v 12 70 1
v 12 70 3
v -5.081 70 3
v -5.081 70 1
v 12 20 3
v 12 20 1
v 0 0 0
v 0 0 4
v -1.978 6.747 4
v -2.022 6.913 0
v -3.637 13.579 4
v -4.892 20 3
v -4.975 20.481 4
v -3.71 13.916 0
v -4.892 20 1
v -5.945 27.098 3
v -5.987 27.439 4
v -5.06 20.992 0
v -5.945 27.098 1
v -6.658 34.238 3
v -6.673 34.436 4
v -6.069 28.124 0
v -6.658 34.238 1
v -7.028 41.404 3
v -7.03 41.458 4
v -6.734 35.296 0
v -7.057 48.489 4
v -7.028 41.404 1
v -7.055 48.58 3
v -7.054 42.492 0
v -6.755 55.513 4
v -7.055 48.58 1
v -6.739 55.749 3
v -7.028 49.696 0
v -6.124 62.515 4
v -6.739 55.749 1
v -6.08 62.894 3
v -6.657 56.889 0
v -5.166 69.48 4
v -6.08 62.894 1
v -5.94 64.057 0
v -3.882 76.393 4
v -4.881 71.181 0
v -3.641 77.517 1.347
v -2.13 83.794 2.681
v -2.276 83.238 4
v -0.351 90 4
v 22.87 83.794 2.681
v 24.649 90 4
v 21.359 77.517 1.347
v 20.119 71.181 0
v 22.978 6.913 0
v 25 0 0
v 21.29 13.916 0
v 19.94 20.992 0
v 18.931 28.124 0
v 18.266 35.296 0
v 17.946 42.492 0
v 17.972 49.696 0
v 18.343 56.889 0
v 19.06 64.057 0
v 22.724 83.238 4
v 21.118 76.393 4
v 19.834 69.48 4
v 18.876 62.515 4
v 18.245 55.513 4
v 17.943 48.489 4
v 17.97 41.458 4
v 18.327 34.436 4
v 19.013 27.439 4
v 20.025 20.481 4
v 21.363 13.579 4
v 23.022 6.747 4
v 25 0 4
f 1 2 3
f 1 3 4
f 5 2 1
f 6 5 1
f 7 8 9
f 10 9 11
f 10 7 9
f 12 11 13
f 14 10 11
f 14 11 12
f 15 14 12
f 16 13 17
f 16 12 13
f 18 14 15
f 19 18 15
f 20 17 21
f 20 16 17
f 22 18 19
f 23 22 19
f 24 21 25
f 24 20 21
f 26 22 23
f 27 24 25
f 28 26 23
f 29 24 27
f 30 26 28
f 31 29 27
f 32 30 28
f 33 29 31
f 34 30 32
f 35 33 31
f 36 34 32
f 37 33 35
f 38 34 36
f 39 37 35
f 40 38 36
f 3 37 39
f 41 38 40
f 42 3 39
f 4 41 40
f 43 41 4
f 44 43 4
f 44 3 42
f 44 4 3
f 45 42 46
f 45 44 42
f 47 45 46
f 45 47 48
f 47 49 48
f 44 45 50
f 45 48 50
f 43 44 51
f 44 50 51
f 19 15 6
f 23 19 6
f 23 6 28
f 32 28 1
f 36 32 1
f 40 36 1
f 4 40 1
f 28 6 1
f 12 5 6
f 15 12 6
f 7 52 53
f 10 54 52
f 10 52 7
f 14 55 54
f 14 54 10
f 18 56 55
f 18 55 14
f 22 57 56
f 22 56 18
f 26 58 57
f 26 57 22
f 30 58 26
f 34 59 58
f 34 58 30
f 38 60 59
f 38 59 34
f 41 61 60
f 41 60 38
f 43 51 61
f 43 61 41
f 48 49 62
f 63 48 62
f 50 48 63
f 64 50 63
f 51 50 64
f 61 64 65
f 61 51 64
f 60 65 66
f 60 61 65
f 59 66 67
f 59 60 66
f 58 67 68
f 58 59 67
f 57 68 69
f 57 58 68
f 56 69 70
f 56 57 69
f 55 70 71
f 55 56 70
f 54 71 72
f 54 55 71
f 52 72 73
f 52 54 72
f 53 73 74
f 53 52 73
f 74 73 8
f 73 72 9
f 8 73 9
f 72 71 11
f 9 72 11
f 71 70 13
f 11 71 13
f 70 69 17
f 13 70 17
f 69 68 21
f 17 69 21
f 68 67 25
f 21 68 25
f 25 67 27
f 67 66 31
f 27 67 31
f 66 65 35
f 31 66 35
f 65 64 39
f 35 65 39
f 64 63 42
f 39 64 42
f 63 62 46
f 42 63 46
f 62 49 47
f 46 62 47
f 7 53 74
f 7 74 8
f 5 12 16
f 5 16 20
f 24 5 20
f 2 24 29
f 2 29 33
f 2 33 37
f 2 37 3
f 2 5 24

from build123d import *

# Parameters (mm, degrees)
EXTRUDE_1_DEPTH          = 4
CUT_EXTRUDE_1_DEPTH      = 26
CUT_EXTRUDE_1_DEPTH_BACK = 8.085570508
SKETCH_3_W               = 2
SKETCH_3_H               = 50
CUT_EXTRUDE_2_DEPTH      = 12
CUT_EXTRUDE_2_DEPTH_BACK = 8.085570508


with BuildPart() as part:
    # 草图1 → 凸台-拉伸1 (new body)
    with BuildSketch(Plane.XY):
        with BuildLine():
            Line((-0.350516392, 90), (24.649483608, 90))
            ThreePointArc((24.649483608, 90), (17.915567088, 44.973091345), (25, 0))
            Line((25, 0), (0, 0))
            ThreePointArc((0, 0), (-7.084432912, 44.973091345), (-0.350516392, 90))
        make_face()
    extrude(amount=EXTRUDE_1_DEPTH)

    # 草图2 → 切除-拉伸1 (cut, two sides)
    with BuildSketch(Plane(origin=(0, 0, 0), x_dir=(0, 0, -1), z_dir=(1, 0, 0))) as cut_extrude_1_sk:
        Polygon((-4, 90), (0, 71.181479562), (0, 90), align=None)
    extrude(amount=CUT_EXTRUDE_1_DEPTH, mode=Mode.SUBTRACT)
    extrude(cut_extrude_1_sk.sketch, amount=-CUT_EXTRUDE_1_DEPTH_BACK, mode=Mode.SUBTRACT)

    # 草图3 → 切除-拉伸2 (cut, two sides)
    with BuildSketch(Plane(origin=(0, 0, 0), x_dir=(0, 0, -1), z_dir=(1, 0, 0))) as cut_extrude_2_sk:
        with Locations((-2, 45)):
            Rectangle(SKETCH_3_W, SKETCH_3_H)
    extrude(amount=CUT_EXTRUDE_2_DEPTH, mode=Mode.SUBTRACT)
    extrude(cut_extrude_2_sk.sketch, amount=-CUT_EXTRUDE_2_DEPTH_BACK, mode=Mode.SUBTRACT)


solid = part.part
